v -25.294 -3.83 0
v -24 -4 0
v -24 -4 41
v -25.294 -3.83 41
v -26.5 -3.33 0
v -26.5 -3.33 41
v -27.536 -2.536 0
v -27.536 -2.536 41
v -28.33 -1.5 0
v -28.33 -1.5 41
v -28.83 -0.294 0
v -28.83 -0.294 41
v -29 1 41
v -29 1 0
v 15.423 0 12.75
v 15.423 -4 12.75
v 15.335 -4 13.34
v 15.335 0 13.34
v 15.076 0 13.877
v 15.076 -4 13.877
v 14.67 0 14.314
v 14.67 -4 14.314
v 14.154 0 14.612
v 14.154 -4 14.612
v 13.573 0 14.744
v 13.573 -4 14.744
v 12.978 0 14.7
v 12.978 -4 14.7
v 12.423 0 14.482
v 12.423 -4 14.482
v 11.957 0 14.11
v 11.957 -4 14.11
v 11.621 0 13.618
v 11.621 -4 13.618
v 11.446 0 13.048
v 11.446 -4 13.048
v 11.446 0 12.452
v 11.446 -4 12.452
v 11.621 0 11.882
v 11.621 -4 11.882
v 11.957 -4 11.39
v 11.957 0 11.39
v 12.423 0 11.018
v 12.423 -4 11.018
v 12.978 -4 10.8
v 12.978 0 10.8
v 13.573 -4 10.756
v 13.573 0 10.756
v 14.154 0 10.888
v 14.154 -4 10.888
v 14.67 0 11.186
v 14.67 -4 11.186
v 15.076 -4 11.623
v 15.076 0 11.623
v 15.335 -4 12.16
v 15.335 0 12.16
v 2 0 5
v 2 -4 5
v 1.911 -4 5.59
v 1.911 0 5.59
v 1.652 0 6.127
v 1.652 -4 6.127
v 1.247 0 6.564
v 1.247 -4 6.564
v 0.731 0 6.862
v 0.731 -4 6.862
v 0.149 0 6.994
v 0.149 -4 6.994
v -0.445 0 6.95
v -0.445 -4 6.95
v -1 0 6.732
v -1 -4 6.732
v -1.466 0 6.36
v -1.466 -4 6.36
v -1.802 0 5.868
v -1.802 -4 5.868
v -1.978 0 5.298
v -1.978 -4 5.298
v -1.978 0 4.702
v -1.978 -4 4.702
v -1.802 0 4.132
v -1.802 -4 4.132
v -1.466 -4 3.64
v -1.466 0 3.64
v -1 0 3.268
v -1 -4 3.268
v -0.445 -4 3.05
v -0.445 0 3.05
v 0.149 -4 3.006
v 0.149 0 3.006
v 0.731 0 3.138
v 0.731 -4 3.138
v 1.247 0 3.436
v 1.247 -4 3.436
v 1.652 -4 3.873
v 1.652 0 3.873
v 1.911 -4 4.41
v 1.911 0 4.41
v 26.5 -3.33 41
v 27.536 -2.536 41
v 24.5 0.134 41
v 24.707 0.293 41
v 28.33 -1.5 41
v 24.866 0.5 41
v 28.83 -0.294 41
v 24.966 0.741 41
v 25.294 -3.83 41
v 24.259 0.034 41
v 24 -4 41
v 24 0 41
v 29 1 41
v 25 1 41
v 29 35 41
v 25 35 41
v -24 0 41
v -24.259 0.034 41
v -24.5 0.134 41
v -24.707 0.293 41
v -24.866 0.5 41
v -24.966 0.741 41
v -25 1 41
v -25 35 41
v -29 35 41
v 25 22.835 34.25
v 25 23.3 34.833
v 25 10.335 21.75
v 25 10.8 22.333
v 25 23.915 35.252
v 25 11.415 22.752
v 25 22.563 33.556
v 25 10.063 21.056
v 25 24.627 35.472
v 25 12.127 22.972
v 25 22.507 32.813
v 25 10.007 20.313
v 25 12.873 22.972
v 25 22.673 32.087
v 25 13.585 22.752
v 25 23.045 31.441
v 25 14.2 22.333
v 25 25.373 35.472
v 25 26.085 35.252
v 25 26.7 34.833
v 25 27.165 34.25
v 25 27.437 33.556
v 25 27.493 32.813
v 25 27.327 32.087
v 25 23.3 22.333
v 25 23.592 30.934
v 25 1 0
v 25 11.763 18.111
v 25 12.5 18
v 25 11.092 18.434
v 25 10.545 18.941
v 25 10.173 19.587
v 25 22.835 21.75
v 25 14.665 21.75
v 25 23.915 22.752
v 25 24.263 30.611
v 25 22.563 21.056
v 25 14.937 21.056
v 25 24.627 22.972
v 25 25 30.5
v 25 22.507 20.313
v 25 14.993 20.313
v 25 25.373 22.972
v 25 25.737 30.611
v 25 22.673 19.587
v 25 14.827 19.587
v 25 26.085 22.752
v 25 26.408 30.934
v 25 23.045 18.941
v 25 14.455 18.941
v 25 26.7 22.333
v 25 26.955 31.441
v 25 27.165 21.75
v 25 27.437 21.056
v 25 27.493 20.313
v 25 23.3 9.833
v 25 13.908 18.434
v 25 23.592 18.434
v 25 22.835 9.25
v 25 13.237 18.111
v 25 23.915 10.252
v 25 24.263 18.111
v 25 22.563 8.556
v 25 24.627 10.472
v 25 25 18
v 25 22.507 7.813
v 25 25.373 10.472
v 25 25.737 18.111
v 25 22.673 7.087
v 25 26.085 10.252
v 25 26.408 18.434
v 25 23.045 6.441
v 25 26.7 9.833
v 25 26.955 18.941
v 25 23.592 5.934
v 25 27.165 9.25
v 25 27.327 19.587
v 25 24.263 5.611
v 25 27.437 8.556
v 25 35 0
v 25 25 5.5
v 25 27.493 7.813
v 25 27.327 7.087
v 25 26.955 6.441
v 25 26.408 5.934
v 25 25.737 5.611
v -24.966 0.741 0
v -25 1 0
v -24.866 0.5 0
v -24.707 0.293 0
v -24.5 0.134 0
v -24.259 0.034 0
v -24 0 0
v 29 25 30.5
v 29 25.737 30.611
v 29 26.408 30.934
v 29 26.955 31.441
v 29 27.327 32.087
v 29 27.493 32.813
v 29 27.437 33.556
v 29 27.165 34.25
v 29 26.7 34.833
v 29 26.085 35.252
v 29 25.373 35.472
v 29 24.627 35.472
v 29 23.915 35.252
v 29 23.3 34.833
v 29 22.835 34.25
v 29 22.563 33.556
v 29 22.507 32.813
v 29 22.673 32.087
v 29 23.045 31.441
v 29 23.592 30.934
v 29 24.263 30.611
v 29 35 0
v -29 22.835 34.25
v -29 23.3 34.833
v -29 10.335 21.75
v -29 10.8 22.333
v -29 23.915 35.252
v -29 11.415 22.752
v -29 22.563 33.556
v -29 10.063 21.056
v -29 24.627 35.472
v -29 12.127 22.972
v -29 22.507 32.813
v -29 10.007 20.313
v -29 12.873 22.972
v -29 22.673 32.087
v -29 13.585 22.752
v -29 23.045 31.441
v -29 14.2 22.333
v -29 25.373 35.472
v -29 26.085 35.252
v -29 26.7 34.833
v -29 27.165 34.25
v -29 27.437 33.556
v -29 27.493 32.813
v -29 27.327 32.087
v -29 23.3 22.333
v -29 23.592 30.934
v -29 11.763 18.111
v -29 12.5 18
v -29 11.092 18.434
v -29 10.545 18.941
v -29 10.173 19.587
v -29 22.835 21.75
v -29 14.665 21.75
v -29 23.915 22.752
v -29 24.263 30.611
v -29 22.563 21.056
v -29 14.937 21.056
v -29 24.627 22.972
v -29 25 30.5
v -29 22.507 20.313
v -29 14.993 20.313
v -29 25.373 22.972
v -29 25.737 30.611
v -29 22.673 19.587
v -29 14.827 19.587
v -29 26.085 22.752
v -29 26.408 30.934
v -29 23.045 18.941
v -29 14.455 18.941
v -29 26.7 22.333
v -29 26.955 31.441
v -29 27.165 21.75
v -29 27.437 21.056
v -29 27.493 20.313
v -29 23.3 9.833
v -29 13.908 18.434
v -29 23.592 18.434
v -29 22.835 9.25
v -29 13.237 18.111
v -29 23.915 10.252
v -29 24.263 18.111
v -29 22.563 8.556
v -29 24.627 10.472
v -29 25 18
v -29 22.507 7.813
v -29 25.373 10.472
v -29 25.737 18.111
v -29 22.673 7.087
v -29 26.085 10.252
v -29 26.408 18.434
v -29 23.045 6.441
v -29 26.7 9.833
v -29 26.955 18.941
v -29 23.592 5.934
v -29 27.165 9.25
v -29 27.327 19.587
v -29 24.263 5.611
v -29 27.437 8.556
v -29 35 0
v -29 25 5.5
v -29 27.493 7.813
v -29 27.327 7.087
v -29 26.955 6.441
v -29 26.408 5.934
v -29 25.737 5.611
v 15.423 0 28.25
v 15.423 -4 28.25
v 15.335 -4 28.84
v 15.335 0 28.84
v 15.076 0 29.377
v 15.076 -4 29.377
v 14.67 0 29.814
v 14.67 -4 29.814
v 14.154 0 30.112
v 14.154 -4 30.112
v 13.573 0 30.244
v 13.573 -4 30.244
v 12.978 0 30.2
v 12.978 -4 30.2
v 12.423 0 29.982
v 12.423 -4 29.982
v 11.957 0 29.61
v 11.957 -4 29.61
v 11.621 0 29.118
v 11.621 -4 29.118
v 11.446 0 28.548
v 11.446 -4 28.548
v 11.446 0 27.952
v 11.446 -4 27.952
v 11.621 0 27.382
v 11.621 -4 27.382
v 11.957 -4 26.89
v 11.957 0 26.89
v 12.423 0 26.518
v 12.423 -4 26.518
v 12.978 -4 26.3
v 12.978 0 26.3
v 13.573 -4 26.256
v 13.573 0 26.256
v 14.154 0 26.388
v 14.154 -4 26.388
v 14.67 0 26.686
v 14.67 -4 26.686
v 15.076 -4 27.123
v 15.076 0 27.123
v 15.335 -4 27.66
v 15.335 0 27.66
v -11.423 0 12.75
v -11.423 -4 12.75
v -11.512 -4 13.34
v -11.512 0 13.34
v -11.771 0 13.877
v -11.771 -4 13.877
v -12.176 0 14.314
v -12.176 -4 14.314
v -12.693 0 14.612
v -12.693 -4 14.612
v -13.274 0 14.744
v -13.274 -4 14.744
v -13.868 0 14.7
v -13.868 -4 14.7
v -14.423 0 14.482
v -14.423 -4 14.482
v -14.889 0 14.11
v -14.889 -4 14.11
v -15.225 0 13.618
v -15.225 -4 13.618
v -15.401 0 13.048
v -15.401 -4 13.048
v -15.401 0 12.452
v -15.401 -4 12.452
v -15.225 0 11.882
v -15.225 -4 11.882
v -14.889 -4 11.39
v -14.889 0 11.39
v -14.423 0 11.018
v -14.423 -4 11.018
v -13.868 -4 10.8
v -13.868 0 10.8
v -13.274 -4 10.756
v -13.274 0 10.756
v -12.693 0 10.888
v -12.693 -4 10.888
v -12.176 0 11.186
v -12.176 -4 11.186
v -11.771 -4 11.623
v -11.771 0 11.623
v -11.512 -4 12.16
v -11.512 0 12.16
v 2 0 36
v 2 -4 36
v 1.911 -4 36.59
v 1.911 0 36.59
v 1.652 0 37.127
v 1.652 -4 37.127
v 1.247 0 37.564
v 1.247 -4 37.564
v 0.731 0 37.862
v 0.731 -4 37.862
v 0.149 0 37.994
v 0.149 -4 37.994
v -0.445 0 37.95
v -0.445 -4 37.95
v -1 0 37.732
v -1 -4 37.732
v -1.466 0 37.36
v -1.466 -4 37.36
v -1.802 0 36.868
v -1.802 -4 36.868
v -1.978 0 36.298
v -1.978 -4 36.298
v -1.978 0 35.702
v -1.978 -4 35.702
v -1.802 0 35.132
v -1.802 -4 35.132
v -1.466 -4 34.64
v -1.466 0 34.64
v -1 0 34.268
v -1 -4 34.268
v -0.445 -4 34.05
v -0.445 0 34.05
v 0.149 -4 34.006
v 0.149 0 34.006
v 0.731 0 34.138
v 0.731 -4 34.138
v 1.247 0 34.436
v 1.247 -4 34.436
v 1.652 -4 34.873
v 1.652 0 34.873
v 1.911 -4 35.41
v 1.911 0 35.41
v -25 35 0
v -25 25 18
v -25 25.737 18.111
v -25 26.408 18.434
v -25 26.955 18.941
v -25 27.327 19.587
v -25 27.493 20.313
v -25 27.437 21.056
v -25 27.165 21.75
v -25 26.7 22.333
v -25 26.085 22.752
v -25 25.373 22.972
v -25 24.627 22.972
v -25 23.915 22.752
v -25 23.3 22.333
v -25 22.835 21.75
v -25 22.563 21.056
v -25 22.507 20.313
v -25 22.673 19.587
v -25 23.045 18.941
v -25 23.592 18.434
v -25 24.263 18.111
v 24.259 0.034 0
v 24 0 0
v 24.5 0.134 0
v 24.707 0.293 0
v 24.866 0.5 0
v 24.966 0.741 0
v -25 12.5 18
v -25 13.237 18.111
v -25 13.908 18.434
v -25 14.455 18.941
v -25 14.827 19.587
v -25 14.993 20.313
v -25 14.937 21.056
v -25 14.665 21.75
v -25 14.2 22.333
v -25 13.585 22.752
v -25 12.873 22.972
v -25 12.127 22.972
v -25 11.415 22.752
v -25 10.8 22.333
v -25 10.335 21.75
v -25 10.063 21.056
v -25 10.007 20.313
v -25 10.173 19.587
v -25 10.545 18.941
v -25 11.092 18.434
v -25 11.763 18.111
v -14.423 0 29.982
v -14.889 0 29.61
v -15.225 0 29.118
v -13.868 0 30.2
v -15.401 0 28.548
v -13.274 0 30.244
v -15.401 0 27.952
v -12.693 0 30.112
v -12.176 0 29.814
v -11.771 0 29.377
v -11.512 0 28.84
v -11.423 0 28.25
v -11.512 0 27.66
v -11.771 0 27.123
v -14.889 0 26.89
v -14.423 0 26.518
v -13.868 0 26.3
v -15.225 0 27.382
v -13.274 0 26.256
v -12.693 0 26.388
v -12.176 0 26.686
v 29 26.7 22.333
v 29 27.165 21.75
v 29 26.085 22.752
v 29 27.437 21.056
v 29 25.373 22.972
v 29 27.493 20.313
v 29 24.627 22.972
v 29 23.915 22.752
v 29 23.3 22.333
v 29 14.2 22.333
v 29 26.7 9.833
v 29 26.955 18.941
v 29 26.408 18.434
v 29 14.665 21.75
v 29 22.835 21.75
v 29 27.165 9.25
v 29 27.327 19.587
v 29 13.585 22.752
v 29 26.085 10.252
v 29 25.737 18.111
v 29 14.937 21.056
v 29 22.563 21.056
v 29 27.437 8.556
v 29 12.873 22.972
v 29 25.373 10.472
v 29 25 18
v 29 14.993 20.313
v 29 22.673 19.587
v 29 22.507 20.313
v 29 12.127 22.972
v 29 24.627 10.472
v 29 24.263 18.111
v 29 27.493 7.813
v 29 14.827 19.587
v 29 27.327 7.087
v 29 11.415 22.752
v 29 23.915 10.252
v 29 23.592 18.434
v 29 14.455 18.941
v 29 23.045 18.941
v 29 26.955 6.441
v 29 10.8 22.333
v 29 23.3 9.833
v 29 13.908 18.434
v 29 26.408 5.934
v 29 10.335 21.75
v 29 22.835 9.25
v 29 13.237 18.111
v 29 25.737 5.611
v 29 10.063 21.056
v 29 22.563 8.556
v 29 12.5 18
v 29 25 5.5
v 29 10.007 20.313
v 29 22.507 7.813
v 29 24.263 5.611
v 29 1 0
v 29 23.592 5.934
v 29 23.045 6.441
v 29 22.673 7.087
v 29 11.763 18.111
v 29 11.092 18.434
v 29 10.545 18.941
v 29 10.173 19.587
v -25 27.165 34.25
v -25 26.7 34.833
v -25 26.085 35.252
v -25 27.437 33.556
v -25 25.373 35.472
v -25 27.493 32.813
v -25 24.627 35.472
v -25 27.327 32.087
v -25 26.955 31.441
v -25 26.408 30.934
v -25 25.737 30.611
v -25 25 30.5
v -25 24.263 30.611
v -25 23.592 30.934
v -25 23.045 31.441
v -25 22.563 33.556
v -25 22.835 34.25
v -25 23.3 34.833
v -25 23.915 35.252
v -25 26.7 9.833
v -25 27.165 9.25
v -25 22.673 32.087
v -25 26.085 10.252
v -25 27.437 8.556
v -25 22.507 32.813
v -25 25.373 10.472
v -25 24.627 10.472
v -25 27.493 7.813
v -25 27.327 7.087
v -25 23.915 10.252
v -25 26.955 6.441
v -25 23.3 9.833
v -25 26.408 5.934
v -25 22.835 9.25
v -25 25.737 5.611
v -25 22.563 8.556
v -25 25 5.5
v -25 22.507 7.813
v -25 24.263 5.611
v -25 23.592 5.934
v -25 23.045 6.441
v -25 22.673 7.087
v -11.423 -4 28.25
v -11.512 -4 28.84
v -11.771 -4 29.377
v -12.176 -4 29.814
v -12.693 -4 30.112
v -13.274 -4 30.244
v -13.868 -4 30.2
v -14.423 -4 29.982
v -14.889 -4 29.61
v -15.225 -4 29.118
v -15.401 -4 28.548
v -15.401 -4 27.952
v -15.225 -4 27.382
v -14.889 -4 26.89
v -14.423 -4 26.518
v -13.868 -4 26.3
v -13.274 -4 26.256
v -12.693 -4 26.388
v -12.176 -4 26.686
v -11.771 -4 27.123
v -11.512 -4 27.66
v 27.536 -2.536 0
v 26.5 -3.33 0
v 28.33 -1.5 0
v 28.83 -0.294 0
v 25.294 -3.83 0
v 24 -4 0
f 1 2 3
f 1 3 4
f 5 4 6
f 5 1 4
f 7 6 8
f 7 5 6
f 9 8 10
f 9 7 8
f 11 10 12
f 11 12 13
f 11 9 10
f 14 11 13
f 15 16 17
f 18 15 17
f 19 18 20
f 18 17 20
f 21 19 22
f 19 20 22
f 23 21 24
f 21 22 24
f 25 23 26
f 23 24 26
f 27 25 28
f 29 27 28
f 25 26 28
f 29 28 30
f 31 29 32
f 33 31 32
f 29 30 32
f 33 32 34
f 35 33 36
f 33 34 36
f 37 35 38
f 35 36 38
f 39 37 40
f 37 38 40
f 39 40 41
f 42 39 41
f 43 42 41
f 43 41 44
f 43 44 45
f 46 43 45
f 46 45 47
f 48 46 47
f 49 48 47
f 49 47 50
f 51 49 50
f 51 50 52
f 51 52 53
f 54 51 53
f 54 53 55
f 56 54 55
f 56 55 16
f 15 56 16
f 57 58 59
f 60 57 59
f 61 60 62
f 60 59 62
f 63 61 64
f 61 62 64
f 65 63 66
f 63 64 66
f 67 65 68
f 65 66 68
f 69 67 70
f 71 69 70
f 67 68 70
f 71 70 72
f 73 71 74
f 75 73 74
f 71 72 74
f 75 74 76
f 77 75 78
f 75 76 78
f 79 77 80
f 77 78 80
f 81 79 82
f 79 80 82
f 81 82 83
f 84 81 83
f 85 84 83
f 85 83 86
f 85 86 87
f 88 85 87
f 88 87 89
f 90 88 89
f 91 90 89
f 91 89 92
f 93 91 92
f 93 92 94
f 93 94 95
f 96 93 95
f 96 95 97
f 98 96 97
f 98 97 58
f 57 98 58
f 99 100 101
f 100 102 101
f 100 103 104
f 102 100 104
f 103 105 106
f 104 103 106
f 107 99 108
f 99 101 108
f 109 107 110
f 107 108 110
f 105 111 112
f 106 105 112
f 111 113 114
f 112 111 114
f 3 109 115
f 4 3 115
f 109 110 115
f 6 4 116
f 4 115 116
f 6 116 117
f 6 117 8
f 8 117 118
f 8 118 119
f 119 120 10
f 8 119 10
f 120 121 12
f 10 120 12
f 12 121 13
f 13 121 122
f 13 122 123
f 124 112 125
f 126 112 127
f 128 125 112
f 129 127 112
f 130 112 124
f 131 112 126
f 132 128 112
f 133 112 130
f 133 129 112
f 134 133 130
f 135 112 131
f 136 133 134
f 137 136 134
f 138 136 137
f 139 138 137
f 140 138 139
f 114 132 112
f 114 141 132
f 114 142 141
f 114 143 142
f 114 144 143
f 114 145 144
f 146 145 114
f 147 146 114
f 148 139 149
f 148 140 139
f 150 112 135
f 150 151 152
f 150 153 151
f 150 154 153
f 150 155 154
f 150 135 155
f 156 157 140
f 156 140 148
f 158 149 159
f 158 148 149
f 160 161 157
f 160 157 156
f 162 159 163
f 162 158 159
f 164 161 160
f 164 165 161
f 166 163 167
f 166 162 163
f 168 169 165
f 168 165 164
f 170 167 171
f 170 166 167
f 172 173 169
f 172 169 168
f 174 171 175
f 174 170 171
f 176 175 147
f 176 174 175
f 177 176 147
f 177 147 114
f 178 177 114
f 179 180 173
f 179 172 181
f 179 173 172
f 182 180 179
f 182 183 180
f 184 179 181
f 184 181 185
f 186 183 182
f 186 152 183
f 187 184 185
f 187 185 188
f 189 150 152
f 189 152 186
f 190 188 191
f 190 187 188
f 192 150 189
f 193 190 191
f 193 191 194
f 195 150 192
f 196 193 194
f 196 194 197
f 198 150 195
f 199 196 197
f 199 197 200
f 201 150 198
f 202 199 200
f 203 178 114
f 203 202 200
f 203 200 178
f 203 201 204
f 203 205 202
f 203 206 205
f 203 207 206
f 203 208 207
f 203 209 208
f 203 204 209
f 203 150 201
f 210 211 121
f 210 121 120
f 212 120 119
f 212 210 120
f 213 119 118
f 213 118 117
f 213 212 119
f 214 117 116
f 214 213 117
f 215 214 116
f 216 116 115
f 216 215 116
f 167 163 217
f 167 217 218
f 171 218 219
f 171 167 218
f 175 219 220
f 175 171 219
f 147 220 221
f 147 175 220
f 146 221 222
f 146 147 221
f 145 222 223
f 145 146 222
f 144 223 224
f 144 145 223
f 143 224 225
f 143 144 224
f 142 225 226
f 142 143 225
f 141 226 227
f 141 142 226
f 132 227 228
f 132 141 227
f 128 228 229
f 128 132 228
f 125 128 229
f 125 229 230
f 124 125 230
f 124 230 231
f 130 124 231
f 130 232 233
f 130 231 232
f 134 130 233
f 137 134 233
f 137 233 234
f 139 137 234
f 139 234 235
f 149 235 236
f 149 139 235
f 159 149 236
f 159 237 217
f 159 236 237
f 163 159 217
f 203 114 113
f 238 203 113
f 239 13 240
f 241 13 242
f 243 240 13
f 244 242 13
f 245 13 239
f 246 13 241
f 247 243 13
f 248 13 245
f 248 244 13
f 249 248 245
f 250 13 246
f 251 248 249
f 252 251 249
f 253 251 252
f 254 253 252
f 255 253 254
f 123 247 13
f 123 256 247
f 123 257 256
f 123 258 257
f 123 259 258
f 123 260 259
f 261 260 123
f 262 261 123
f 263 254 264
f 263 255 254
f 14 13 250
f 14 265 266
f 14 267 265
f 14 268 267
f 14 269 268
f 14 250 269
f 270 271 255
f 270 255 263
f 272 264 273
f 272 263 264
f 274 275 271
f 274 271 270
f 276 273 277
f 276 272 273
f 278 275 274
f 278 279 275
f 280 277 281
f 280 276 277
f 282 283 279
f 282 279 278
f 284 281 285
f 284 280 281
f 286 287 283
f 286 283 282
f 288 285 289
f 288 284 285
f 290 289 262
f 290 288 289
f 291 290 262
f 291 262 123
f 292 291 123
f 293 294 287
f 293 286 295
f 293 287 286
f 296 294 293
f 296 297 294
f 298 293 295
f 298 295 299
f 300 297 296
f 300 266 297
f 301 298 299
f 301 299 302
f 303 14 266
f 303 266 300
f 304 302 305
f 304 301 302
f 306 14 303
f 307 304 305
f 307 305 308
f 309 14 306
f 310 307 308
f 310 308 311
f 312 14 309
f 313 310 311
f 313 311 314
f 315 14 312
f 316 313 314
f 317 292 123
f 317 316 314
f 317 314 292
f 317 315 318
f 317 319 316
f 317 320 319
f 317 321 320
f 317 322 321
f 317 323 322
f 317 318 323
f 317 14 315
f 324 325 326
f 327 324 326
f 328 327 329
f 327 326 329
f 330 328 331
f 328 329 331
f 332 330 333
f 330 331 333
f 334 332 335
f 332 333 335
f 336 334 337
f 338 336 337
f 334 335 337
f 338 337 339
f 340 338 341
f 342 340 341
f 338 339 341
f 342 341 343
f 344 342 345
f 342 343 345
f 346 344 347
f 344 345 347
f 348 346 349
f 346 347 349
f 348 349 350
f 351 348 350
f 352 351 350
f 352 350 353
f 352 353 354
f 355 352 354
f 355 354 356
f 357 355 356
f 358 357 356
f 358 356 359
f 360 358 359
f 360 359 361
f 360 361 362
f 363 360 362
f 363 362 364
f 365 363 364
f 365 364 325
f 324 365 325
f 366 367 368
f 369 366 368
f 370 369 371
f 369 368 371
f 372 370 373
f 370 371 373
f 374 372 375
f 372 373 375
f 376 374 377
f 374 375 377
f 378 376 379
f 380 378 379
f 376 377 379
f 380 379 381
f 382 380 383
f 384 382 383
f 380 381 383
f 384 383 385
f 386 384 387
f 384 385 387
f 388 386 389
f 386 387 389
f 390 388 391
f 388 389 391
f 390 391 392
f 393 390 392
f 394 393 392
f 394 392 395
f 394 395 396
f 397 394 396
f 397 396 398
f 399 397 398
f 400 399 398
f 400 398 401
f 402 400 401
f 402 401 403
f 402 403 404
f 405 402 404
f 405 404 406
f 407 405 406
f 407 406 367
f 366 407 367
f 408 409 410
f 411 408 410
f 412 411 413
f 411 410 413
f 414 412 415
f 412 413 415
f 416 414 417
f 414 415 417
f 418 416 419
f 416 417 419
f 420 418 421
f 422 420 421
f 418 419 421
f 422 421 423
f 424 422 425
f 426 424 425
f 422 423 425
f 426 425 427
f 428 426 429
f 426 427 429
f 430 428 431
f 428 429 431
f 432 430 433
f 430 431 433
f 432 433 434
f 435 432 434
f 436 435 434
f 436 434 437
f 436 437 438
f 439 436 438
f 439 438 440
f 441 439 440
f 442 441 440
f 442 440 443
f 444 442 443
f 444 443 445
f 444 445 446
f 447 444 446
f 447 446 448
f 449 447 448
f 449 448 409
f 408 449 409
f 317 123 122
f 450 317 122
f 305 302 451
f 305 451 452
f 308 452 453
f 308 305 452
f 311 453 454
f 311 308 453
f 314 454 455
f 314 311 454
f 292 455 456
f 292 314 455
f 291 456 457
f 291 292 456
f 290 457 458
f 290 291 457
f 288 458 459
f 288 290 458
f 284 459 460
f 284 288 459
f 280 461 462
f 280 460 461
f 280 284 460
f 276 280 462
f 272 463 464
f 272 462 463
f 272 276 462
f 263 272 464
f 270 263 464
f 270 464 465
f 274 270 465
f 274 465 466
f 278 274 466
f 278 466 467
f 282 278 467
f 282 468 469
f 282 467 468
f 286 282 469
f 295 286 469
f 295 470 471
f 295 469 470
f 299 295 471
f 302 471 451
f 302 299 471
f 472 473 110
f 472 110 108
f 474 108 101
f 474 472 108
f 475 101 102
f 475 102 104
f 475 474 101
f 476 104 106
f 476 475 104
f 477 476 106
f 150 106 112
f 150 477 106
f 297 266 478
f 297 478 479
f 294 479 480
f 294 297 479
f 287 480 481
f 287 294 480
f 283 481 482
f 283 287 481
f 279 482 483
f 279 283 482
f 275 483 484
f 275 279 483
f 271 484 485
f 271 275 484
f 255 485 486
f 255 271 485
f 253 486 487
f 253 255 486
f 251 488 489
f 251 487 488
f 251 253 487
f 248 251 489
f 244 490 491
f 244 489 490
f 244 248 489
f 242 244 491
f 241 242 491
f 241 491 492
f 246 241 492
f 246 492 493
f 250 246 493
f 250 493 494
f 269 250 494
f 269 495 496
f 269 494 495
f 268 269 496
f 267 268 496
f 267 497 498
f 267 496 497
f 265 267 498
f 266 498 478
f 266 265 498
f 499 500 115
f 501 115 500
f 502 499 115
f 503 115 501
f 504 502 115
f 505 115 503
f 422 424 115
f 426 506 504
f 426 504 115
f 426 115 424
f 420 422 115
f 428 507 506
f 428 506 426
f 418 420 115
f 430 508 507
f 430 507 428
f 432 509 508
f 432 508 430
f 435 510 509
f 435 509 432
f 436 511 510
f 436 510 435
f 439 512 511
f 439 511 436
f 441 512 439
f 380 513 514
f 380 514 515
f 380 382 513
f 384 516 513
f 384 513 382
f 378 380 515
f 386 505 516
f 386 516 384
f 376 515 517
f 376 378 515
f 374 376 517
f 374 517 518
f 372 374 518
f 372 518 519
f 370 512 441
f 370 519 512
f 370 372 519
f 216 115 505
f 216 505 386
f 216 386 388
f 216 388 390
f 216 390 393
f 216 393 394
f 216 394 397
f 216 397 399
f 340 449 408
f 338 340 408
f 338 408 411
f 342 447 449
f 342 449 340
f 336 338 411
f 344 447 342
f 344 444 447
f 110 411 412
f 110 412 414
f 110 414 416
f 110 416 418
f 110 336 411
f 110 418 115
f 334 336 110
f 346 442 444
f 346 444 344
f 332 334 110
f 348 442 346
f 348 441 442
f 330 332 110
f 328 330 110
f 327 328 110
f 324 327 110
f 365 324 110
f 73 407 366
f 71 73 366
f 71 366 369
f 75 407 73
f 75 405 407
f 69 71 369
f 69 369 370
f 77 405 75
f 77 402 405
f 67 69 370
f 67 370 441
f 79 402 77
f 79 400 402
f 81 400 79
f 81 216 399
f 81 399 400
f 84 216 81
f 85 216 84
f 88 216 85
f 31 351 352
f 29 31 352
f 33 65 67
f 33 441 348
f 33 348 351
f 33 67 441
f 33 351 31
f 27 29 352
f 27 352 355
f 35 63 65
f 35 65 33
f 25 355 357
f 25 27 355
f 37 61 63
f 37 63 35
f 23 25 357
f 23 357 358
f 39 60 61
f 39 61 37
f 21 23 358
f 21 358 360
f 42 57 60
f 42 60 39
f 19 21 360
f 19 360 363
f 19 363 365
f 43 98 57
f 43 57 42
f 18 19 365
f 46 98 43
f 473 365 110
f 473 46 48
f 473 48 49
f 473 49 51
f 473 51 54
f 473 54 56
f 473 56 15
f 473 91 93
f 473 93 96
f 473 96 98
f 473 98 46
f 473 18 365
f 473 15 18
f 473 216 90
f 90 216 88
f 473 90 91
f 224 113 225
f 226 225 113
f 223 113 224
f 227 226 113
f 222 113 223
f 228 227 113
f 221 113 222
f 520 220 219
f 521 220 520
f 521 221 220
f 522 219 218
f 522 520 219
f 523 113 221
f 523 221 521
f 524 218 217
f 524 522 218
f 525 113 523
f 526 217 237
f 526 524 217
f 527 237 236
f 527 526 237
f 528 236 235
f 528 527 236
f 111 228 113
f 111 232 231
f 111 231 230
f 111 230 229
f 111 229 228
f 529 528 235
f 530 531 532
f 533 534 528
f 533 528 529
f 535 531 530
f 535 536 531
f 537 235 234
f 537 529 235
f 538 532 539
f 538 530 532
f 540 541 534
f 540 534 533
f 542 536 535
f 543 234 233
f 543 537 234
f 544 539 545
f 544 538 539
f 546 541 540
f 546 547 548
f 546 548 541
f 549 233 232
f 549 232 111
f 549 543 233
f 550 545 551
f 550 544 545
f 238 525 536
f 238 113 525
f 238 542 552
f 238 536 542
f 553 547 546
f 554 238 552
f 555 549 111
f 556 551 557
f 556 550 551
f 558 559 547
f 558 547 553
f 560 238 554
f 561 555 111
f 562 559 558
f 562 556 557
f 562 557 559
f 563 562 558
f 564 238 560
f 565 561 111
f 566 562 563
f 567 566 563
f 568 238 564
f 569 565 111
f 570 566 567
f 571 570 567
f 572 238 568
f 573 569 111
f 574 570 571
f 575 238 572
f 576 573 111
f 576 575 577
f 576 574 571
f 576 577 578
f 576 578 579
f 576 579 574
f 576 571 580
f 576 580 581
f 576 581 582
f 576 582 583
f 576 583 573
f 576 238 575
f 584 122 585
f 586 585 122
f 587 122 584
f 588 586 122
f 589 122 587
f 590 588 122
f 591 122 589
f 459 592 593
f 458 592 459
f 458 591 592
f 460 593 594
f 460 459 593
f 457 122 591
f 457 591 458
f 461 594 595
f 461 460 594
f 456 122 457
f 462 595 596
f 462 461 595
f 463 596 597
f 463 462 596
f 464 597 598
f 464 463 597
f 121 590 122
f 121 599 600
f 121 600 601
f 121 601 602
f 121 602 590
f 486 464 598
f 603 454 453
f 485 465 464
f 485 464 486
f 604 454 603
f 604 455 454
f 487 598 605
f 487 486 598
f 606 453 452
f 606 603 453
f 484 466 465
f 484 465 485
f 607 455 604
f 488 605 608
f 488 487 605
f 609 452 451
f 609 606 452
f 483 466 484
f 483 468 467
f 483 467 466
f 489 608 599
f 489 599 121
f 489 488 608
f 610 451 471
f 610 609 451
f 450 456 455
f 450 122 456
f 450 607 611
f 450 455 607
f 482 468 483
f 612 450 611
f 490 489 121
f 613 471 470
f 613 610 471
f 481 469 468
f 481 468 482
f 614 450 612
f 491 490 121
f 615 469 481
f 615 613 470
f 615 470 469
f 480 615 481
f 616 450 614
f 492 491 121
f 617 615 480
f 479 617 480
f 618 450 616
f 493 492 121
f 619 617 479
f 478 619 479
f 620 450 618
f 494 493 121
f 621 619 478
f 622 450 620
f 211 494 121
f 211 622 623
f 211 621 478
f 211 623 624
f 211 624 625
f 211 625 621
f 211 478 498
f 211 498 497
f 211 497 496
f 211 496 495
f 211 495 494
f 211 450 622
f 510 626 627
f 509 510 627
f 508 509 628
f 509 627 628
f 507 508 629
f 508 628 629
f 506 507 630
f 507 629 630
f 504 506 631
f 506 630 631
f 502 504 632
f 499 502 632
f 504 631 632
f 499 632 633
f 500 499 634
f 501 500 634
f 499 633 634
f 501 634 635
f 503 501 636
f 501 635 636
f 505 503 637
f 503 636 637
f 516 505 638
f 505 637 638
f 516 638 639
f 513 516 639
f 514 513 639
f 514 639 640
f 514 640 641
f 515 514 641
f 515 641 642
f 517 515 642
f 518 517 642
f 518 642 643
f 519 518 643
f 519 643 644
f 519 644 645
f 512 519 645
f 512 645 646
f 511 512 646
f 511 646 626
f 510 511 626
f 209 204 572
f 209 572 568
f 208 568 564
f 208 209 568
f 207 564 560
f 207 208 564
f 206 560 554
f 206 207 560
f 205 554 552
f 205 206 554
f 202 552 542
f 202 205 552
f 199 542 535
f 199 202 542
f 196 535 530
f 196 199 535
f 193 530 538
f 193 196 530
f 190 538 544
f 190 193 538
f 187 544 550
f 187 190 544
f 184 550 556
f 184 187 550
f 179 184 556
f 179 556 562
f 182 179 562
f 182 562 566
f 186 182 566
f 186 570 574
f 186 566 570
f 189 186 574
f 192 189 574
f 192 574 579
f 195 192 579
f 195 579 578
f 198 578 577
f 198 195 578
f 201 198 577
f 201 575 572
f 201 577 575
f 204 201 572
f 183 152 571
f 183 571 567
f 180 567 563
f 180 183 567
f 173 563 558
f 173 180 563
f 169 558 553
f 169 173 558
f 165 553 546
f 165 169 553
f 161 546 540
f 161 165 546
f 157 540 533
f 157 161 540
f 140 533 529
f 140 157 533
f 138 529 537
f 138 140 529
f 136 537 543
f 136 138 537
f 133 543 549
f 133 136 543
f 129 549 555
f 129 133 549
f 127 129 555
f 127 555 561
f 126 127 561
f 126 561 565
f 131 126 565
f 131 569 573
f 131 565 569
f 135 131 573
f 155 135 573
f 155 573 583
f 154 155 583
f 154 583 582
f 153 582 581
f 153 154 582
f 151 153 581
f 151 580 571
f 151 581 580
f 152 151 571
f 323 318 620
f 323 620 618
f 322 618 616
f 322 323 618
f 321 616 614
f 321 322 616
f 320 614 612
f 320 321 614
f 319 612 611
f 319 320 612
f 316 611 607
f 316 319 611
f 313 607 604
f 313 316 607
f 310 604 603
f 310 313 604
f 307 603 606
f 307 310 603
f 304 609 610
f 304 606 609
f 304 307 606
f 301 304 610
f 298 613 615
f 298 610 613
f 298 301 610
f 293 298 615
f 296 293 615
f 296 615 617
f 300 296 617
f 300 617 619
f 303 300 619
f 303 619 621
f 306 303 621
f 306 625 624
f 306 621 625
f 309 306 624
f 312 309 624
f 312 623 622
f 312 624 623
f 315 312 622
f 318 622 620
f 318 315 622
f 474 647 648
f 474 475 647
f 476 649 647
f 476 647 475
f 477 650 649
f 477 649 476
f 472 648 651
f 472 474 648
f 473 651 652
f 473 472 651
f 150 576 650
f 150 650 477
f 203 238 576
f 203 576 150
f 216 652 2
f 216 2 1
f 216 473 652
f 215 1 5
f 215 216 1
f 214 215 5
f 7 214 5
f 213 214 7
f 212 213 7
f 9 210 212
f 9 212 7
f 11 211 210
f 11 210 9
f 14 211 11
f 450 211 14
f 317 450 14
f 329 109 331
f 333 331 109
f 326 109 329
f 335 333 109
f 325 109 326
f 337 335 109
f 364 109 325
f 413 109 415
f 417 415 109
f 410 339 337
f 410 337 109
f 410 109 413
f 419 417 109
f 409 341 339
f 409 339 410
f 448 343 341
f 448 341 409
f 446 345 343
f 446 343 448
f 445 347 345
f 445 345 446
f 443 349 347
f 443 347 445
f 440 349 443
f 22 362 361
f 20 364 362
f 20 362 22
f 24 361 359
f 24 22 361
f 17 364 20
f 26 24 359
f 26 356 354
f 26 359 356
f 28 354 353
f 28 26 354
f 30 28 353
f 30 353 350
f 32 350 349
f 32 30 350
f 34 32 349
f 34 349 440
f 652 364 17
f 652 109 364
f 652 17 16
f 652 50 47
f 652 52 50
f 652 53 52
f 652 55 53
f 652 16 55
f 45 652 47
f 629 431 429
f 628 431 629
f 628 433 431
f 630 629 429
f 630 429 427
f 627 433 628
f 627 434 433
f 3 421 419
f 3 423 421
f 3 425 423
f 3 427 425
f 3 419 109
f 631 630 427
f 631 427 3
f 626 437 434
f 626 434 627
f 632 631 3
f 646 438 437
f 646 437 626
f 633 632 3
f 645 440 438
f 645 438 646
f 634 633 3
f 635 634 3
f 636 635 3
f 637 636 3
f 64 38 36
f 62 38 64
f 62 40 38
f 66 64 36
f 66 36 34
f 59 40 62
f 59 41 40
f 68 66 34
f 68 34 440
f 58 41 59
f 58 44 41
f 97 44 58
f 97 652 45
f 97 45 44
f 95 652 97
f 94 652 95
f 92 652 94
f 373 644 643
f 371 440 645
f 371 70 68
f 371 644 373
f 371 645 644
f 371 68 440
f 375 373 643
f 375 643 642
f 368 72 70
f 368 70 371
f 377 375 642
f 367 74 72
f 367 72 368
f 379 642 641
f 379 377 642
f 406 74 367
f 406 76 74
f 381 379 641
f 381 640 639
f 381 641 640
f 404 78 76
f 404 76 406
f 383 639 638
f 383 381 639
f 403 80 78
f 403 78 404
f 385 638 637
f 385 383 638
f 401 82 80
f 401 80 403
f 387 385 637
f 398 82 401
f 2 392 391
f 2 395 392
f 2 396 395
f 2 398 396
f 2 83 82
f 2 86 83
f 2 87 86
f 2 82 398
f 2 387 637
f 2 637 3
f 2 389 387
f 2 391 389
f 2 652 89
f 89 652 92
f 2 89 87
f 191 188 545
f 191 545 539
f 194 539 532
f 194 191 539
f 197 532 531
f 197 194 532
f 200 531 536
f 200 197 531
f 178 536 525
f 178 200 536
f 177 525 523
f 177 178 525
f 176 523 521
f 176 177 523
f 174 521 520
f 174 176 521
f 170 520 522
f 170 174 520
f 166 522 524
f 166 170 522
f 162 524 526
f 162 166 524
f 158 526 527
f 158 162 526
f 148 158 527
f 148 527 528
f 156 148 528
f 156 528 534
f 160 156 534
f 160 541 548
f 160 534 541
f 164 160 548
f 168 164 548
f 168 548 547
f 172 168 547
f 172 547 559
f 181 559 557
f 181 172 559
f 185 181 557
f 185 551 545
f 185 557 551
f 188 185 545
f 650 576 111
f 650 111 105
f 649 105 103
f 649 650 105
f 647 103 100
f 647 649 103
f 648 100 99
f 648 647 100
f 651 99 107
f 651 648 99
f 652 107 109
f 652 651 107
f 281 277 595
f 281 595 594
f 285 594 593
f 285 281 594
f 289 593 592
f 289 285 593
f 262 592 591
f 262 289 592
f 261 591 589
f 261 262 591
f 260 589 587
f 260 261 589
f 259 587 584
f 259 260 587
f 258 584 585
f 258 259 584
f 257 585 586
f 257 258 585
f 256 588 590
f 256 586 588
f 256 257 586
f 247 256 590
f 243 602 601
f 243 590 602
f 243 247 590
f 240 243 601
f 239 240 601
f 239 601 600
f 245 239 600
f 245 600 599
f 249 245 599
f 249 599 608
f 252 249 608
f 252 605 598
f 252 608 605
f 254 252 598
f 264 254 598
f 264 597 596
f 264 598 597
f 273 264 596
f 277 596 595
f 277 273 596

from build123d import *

# Parameters (mm, degrees)
SM_BASE_FLANGE_1_DEPTH   = 41
SKETCH_9_R               = 2
CUT_EXTRUDE_4_DEPTH      = 64.584589328
CUT_EXTRUDE_5_DEPTH      = 80.183331579
CUT_EXTRUDE_5_DEPTH_BACK = 80.183331579
SKETCH_10_R              = 2.5


# Sheet-metal steps are written as plain solids
with BuildPart() as part:
    # Sketch 1 → Базовая кромка1 (new body)
    with BuildSketch(Plane.XY):
        with BuildLine():
            Line((-25, 35), (-25, 1))
            ThreePointArc((-25, 1), (-24.707106781, 0.292893219), (-24, 0))
            Line((-24, 0), (24, 0))
            ThreePointArc((24, 0), (24.707106781, 0.292893219), (25, 1))
            Line((25, 1), (25, 35))
            Line((25, 35), (29, 35))
            Line((29, 35), (29, 1))
            ThreePointArc((29, 1), (27.535533906, -2.535533906), (24, -4))
            Line((24, -4), (-24, -4))
            ThreePointArc((-24, -4), (-27.535533906, -2.535533906), (-29, 1))
            Line((-29, 1), (-29, 35))
            Line((-29, 35), (-25, 35))
        make_face()
    extrude(amount=SM_BASE_FLANGE_1_DEPTH)

    # Эскиз9 → Вырез-Вытянуть4 (cut, through all)
    with BuildSketch(Plane.XZ.offset(4)):
        with Locations((0, 5)):
            Circle(SKETCH_9_R)
        with Locations((-13.423393759, 12.75)):
            Circle(SKETCH_9_R)
        with Locations((-13.423393759, 28.25)):
            Circle(SKETCH_9_R)
        with Locations((0, 36)):
            Circle(SKETCH_9_R)
        with Locations((13.423393759, 28.25)):
            Circle(SKETCH_9_R)
        with Locations((13.423393759, 12.75)):
            Circle(SKETCH_9_R)
    extrude(amount=-CUT_EXTRUDE_4_DEPTH, mode=Mode.SUBTRACT)

    # Эскиз10 → Вырез-Вытянуть5 (cut, two sides: drawn at the far end of the back side and taken through both)
    with BuildSketch(Plane(origin=(29, 0, 0), x_dir=(0, 0, -1), z_dir=(1, 0, 0)).offset(-CUT_EXTRUDE_5_DEPTH_BACK)):
        with Locations((-33, 25)):
            Circle(SKETCH_10_R)
        with Locations((-20.5, 25)):
            Circle(SKETCH_10_R)
        with Locations((-8, 25)):
            Circle(SKETCH_10_R)
        with Locations((-20.5, 12.5)):
            Circle(SKETCH_10_R)
    extrude(amount=CUT_EXTRUDE_5_DEPTH + CUT_EXTRUDE_5_DEPTH_BACK, mode=Mode.SUBTRACT)


solid = part.part
